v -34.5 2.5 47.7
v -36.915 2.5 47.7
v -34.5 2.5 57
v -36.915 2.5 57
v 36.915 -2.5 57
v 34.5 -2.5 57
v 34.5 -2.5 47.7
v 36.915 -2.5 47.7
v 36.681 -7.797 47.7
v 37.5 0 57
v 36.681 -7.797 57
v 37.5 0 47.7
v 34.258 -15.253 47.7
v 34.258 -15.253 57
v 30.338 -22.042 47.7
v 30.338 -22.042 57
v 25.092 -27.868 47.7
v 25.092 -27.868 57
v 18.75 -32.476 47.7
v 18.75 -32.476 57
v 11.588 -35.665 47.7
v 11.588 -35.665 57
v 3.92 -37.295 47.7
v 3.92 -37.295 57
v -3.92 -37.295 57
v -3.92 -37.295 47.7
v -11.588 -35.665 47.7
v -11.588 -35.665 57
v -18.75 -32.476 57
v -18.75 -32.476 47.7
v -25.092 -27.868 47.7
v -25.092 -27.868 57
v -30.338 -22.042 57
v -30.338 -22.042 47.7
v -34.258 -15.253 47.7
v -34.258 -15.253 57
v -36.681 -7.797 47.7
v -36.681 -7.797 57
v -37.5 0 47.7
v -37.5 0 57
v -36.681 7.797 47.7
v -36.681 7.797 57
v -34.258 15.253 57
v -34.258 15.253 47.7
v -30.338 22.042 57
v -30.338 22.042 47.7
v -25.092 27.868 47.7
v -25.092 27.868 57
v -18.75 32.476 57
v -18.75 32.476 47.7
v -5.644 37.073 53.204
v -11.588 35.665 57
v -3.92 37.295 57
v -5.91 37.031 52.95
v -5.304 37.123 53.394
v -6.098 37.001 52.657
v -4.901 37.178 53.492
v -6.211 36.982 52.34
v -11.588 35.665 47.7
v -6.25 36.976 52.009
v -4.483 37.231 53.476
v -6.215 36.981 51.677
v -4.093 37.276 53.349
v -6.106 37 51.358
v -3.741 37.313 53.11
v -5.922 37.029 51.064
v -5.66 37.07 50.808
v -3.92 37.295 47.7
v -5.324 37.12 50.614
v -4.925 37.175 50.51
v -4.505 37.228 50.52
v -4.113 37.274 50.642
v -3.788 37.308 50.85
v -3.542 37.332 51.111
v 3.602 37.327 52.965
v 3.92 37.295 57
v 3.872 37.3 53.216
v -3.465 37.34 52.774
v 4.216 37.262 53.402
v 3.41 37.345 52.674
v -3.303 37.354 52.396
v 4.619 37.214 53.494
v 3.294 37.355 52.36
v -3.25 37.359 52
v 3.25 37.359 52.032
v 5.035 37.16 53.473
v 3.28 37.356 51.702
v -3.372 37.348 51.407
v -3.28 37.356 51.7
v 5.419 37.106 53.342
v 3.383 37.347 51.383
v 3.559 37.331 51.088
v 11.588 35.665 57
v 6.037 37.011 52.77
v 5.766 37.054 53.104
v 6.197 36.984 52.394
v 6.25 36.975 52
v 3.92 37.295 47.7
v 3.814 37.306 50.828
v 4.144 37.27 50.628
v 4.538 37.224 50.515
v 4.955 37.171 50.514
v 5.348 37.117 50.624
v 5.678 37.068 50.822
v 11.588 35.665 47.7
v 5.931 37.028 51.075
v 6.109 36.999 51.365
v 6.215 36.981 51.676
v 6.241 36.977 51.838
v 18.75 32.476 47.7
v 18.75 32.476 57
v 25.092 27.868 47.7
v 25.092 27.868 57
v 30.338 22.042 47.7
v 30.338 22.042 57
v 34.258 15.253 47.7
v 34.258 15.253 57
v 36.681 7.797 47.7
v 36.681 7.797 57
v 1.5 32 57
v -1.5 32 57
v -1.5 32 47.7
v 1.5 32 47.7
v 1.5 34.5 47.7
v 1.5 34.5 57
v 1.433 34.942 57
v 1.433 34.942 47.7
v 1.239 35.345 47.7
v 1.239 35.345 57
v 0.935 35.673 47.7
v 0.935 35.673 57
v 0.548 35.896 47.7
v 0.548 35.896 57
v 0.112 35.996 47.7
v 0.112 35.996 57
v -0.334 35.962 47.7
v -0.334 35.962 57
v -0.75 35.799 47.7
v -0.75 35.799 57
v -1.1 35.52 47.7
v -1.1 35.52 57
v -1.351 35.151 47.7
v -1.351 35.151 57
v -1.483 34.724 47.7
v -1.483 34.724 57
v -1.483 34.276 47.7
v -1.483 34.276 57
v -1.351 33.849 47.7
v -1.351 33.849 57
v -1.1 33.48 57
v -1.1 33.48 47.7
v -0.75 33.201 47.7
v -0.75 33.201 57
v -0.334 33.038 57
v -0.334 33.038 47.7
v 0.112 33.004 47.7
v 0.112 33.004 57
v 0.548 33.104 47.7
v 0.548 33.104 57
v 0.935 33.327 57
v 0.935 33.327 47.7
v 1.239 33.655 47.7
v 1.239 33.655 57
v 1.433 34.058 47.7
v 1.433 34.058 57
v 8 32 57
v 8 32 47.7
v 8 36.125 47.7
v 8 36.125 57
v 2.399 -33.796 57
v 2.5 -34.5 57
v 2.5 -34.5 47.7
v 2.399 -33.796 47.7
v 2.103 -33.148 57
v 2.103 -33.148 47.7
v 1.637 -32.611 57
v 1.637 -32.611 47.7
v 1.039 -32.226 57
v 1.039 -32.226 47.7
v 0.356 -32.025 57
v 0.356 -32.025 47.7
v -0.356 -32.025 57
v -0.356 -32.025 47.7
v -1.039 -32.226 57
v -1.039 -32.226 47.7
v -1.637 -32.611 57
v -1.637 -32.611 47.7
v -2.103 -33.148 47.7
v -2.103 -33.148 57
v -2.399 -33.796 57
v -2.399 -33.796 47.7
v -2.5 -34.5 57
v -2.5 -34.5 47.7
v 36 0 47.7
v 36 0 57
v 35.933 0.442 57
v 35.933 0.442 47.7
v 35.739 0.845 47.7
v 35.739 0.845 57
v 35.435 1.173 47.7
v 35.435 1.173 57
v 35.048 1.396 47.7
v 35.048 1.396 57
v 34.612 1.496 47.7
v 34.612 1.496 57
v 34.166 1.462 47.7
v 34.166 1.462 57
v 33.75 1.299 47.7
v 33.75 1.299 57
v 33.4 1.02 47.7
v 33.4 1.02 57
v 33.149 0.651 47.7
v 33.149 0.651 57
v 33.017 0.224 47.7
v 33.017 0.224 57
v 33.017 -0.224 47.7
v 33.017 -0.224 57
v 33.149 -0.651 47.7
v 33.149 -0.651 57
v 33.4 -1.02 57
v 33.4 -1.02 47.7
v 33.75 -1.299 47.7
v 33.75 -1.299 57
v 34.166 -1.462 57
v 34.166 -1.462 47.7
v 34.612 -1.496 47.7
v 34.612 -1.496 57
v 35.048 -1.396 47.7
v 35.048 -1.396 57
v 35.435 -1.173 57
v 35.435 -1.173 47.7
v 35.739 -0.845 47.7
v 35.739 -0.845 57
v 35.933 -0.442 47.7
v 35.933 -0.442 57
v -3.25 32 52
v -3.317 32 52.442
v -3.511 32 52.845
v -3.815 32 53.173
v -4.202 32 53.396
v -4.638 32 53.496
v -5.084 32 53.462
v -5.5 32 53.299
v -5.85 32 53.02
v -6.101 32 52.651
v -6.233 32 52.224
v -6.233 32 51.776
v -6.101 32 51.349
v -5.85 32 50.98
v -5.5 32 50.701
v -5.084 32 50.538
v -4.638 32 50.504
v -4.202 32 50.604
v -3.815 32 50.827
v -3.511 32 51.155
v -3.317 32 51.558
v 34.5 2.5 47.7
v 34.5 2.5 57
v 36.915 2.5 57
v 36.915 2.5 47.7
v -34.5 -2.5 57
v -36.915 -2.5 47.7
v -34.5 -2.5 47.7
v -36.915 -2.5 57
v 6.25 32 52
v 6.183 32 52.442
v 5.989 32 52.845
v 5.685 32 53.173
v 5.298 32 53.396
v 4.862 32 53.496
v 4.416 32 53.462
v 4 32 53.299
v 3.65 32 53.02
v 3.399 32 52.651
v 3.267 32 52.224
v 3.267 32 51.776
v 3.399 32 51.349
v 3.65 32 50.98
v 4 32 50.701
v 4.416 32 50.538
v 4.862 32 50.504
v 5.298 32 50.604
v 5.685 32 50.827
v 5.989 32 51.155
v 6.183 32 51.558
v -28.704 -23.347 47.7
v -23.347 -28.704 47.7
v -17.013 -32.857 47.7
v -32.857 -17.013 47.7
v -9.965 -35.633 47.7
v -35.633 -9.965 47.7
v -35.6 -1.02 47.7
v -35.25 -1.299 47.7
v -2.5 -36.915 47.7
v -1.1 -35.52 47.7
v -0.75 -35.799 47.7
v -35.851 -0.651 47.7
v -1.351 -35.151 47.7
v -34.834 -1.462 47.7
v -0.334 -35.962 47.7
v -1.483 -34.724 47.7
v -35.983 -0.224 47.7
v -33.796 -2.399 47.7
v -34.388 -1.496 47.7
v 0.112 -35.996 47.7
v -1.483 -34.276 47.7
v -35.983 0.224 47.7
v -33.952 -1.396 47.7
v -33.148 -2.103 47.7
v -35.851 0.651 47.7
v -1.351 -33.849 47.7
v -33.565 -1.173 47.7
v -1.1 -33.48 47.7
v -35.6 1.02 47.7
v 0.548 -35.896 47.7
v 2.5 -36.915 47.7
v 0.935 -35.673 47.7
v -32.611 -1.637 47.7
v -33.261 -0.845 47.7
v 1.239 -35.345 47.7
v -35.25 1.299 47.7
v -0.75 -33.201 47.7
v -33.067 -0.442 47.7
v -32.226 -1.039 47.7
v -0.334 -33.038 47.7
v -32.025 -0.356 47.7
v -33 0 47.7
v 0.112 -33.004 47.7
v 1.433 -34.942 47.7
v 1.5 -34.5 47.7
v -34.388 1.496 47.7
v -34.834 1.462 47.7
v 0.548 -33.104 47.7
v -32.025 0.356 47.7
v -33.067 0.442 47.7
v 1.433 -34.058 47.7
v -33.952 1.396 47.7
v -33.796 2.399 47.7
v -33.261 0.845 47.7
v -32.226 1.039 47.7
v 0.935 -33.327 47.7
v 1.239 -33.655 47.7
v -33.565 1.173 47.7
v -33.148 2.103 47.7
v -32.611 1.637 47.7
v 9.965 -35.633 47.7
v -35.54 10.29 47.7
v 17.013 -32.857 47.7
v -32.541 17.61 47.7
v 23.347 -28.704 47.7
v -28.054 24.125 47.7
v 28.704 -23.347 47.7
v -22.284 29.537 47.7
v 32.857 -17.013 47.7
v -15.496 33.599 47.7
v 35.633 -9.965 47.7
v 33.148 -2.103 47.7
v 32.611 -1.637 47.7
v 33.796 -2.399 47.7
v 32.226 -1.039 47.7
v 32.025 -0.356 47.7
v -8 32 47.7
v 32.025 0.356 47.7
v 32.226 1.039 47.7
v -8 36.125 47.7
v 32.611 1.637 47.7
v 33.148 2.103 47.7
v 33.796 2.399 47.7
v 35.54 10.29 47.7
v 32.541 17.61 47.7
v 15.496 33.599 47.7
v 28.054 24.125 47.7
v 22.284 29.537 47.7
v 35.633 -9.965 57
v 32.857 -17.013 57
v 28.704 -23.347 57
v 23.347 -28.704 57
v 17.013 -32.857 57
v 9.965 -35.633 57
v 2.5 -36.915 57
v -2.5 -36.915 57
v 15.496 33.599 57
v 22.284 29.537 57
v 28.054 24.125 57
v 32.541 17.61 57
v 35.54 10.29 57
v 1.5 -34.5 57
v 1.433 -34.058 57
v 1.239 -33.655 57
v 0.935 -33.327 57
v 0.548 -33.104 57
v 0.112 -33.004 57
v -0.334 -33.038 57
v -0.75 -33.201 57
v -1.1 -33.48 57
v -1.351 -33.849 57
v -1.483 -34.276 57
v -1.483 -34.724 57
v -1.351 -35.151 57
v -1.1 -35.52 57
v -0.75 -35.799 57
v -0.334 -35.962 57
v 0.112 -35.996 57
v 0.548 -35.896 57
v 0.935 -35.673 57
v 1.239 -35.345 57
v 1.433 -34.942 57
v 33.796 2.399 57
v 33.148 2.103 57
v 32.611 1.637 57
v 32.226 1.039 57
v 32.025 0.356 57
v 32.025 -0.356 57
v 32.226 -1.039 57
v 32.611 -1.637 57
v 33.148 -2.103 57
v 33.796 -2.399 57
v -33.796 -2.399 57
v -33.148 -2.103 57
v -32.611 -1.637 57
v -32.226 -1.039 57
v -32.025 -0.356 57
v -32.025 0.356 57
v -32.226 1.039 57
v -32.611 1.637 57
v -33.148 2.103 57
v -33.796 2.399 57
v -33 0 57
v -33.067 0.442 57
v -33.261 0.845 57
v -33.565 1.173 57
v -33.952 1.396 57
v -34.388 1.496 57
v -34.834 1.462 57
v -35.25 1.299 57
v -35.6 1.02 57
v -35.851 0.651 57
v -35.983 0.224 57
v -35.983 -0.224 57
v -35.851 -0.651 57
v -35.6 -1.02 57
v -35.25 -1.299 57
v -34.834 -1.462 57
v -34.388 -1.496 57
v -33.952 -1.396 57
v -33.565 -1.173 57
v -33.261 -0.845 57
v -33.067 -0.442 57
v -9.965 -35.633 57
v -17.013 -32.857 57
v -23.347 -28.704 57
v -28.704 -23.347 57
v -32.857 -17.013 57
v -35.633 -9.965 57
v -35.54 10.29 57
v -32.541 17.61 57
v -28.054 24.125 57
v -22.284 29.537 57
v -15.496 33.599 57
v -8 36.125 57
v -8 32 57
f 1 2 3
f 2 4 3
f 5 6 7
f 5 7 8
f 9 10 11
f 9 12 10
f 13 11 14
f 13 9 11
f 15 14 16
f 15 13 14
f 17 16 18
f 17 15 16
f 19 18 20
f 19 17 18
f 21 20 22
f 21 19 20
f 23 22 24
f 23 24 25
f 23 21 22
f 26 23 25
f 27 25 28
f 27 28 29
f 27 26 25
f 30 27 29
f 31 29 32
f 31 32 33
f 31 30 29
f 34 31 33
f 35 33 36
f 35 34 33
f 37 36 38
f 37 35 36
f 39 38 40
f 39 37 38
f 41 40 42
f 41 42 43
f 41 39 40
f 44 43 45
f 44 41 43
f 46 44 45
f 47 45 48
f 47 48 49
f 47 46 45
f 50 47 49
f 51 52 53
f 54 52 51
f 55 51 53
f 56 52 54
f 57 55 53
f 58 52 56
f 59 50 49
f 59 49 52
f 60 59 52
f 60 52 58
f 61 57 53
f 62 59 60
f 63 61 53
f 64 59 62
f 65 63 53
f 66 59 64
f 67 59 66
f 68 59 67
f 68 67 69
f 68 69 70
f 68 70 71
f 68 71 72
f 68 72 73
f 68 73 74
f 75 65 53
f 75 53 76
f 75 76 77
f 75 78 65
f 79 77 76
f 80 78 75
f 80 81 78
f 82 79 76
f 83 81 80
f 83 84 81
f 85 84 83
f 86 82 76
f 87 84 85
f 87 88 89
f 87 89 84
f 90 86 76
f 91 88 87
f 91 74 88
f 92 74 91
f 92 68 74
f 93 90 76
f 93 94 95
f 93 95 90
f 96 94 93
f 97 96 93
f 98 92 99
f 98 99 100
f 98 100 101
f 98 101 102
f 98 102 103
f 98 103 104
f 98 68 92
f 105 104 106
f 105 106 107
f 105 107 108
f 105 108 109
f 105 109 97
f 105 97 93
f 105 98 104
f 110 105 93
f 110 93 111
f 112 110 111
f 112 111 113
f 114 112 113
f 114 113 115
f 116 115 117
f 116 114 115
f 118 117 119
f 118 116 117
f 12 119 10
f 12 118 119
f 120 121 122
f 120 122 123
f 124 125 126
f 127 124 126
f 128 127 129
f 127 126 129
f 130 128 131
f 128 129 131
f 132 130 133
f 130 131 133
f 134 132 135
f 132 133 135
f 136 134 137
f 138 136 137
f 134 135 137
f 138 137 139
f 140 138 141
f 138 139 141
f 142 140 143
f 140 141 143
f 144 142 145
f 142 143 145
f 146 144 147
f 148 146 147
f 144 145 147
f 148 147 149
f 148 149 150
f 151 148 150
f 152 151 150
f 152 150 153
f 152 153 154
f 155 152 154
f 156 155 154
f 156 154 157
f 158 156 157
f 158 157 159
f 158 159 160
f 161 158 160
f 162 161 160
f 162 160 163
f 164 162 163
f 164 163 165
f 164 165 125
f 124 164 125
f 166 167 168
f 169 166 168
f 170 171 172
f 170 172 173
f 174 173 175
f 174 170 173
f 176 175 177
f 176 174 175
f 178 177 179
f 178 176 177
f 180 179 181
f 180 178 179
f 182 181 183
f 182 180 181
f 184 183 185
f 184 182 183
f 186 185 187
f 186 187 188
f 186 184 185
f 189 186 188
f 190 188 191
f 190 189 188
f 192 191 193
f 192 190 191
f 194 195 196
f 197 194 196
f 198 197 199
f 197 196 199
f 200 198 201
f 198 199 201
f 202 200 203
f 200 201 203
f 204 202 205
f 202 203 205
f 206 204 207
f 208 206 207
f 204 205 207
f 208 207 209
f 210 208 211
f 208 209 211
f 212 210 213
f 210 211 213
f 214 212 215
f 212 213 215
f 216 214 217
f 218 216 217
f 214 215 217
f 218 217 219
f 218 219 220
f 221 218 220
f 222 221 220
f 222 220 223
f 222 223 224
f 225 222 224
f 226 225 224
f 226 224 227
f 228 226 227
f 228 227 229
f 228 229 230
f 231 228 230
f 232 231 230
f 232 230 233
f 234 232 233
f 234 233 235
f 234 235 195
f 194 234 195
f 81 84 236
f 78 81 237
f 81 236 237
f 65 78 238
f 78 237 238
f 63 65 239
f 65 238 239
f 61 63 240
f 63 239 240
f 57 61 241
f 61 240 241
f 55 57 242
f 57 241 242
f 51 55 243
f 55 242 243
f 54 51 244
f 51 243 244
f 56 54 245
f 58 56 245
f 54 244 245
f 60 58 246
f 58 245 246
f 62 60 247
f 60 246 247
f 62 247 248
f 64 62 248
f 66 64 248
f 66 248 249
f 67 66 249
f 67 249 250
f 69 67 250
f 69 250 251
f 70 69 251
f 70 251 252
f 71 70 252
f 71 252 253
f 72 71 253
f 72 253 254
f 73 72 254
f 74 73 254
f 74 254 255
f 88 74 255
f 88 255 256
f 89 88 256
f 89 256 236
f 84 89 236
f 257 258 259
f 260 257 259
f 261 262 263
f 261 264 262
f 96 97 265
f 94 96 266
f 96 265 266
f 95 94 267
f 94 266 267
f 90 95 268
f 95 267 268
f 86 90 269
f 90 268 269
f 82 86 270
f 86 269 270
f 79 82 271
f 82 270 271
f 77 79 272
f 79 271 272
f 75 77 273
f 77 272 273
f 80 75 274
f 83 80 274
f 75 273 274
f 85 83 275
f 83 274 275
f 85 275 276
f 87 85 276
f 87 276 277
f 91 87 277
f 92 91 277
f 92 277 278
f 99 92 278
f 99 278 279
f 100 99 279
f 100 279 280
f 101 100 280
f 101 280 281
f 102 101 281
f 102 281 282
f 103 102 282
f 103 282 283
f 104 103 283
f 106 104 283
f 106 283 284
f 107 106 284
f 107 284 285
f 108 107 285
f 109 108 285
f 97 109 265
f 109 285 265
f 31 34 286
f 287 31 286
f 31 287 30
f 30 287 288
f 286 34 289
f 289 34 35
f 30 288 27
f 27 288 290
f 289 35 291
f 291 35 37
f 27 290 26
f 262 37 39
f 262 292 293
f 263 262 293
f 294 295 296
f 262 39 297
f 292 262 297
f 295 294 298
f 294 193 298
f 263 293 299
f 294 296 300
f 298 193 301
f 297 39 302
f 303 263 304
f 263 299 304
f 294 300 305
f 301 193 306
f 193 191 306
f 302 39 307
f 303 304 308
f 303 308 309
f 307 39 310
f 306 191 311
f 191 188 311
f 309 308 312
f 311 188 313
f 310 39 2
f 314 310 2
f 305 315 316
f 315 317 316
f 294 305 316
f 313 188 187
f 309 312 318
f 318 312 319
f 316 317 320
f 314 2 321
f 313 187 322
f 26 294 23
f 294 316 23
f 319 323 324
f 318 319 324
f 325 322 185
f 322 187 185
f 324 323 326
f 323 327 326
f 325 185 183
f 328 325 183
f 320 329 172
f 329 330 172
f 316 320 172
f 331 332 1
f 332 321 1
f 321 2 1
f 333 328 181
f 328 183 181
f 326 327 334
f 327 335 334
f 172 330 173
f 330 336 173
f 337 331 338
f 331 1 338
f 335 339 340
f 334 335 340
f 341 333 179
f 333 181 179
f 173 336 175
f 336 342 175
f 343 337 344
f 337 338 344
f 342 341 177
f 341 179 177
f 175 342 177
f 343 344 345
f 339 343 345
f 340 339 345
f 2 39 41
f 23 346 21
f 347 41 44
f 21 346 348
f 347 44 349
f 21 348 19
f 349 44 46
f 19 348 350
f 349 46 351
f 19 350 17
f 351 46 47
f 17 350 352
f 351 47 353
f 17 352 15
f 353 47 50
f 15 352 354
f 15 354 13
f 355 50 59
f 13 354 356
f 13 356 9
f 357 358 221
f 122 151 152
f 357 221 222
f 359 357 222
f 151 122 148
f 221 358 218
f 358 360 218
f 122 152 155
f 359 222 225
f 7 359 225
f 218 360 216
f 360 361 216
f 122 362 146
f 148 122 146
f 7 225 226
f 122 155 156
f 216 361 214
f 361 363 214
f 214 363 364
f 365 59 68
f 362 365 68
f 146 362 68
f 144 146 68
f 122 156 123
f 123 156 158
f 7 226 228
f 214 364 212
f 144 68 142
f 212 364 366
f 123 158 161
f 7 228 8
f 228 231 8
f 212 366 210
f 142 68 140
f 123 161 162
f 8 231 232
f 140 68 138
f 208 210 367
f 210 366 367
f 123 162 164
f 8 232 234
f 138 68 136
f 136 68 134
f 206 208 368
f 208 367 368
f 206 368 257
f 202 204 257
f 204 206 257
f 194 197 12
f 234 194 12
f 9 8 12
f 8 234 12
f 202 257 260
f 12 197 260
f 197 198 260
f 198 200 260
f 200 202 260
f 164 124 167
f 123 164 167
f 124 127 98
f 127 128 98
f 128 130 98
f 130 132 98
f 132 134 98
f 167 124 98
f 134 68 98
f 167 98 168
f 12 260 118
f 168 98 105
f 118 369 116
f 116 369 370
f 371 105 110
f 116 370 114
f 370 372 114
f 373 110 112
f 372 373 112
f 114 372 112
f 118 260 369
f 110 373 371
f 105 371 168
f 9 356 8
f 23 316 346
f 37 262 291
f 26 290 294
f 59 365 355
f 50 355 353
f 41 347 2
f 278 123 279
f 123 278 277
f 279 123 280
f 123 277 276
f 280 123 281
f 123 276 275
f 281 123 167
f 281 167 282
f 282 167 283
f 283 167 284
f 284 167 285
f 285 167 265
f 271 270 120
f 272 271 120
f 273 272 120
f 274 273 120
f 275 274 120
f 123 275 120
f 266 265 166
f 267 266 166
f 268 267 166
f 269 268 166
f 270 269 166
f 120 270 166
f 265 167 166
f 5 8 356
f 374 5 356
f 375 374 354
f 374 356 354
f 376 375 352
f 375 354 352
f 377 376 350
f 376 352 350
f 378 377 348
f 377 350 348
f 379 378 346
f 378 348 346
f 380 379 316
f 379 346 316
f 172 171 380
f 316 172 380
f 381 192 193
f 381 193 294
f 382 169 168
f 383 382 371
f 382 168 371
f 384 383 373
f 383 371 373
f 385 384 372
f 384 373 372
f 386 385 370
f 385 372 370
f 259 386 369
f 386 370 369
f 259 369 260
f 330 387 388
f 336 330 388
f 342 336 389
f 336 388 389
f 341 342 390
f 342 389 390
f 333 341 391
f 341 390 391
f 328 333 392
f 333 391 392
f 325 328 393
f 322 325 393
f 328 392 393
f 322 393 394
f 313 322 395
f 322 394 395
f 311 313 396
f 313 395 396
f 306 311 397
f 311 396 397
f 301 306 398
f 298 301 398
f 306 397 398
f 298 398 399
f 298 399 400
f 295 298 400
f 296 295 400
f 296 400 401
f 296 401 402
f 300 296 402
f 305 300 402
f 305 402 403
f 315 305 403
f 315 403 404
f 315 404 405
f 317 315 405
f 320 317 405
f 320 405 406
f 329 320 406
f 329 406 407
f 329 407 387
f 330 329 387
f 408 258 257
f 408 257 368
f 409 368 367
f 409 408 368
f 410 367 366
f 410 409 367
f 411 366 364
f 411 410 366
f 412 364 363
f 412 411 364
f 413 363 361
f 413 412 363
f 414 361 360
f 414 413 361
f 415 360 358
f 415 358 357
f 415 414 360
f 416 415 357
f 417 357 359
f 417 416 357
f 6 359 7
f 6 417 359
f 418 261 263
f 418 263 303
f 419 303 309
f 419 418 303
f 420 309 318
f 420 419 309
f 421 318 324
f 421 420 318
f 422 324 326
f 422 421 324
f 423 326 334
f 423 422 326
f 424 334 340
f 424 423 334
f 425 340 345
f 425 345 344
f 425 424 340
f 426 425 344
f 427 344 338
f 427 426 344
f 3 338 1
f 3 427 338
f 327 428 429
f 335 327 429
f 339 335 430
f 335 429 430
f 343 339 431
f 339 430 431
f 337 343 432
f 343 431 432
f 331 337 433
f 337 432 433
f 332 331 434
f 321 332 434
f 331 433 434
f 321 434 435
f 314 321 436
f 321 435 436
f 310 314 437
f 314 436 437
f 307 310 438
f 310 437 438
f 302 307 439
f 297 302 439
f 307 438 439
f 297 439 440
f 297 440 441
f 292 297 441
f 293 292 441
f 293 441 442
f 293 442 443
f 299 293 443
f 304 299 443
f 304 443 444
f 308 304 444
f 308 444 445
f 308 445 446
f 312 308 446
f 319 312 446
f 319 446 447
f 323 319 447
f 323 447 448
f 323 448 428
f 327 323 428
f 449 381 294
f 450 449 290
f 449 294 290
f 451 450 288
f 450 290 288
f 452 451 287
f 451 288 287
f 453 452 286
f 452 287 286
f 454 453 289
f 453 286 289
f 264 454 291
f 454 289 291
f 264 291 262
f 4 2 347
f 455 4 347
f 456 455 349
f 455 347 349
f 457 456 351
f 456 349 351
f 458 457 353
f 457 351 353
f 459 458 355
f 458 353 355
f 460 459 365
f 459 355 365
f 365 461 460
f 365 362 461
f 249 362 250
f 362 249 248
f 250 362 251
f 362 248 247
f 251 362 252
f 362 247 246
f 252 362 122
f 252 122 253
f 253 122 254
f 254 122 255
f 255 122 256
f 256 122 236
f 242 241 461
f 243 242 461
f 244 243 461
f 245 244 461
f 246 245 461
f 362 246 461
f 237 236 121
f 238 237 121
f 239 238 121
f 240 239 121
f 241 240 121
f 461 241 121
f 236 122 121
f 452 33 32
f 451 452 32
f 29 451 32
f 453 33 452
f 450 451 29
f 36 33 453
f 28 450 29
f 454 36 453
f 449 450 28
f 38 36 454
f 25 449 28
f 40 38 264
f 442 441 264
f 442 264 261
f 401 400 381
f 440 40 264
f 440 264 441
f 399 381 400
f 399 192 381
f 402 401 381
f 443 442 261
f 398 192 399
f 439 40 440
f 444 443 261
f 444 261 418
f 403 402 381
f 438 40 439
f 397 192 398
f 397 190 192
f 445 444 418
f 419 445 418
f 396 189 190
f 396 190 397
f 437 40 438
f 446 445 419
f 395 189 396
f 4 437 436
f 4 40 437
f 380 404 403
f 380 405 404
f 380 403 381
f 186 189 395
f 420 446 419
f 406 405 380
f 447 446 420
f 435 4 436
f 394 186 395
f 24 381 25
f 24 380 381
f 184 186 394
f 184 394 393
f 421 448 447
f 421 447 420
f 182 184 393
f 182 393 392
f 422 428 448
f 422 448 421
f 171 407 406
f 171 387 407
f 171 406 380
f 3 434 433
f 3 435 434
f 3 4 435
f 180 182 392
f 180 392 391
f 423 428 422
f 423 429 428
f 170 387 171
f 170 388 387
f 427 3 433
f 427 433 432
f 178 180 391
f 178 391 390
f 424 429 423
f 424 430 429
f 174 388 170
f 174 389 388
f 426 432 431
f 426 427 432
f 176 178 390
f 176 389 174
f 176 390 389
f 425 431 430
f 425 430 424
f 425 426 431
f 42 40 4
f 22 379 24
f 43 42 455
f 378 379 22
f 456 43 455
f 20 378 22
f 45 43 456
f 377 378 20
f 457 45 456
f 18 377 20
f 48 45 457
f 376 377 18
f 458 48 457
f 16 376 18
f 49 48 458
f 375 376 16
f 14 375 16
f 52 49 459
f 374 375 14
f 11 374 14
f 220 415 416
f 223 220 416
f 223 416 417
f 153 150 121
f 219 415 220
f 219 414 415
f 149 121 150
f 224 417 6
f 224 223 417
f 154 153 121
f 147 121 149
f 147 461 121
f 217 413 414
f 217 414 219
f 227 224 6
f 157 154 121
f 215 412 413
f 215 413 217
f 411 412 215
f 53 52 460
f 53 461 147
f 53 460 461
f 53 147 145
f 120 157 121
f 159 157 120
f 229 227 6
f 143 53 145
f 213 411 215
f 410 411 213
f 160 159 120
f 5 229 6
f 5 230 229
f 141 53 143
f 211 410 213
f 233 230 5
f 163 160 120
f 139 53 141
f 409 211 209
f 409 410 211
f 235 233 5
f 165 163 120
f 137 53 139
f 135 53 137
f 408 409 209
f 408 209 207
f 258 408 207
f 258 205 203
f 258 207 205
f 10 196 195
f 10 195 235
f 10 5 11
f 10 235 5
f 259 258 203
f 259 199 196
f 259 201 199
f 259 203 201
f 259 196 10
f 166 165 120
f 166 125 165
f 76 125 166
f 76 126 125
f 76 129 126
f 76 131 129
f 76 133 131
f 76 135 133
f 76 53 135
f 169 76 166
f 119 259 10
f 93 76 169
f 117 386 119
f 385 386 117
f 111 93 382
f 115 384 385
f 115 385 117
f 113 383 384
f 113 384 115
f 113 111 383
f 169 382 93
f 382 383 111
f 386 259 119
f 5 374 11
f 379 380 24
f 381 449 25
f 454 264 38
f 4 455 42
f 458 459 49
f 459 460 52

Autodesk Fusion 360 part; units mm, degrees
sketch "Esboço2" plane through (0, 0, 0) normal (0, 0, 1) x (1, 0, 0)
  circle A0 centre (0, 0) radius 37.5
  circle A1 centre (0, 0) radius 37
  dimension "d6" = 75
  dimension "d7" = 74
extrude "Extrusão2" add sketch "Esboço2" along normal blind 190
ref_plane "Plano de trabalho9" through (0, 0, 187) normal (0, 0, 1) x (1, 0, 0)
sketch "Esboço10" plane through (0, 0, 187) normal (0, 0, 1) x (1, 0, 0)
  circle A0 centre (0, 0) radius 34.5 construction
  line L0 (0, 0) -> (-68.1762, 0) construction
  line L1 (0, 0) -> (60, 0) construction
  line L2 (0, 0) -> (0, 45) construction
  line L3 (0, 0) -> (0, -43.1659) construction
  circle A1 centre (34.5, 0) radius 1.5
  line L4 (3, -43) -> (3, -42)
  circle A2 centre (0, 34.5) radius 1.5
  circle A3 centre (-34.5, 0) radius 1.5
  circle A4 centre (0, -34.5) radius 1.5
  arc A5 (34.5, 2.5) -> (34.5, -2.5) centre (34.5, 0) ccw
  arc A6 (-2.5, 34.5) -> (2.5, 34.5) centre (0, 34.5) ccw
  arc A7 (-34.5, -2.5) -> (-34.5, 2.5) centre (-34.5, 0) ccw
  arc A8 (2.5, -34.5) -> (-2.5, -34.5) centre (0, -34.5) ccw
  circle A9 centre (0, 0) radius 37
  line L5 (-36.9154, 2.5) -> (-34.4093, 2.5)
  line L6 (-36.9154, -2.5) -> (-34.4093, -2.5)
  line L7 (34.5, 2.5) -> (36.9154, 2.5)
  line L8 (34.5, -2.5) -> (36.9154, -2.5)
  line L9 (2.5, 36.9154) -> (2.5, 34.4093)
  line L10 (-2.5, 36.9154) -> (-2.5, 34.4093)
  line L11 (-2.5, -34.4093) -> (-2.5, -36.9154)
  line L12 (2.5, -34.4093) -> (2.5, -36.9154)
  dimension "d82" = 69
  dimension "d83" = 3
  dimension "d84" = 2.5
  dimension "d85" = 2.5
  dimension "d87" = 360
  dimension "d89" = 360
  dimension "d90" = 2.5
extrude "Extrusão12" add sketch "Esboço10" against normal blind 184 contours A5 A9 L7 L8 | A6 A9 L9 L10 | A8 A9 L11 L12 | A7 A9 L5 L6
thread "Rosca3"
ref_plane "Plano de trabalho3" through (0, 0, 32) normal (0, 0, 1) x (1, 0, 0)
sketch "Esboço3" plane through (0, 0, 32) normal (0, 0, 1) x (1, 0, 0)
  line L0 (0, 0) -> (0, 37) construction
  line L1 (34.2491, 14) -> (-34.2491, 14)
  circle A0 centre (0, 0) radius 37
  line L2 (31.1288, 20) -> (-31.1288, 20)
  line L3 (32.8634, 17) -> (-32.8634, 17)
  circle A1 centre (0, 0) radius 50
  circle A2 centre (0, 0) radius 37.5
  line L4 (-8, 0) -> (8, 0)
  line L5 (8, 0) -> (8, 36.1248)
  line L6 (-8, 0) -> (-8, 36.1248)
  circle A3 centre (0, 34.5) radius 1.5
  line L7 (1.5, 32.5) -> (1.5, 0)
  arc A4 (-2.5, 34.5) -> (2.5, 34.5) centre (0, 34.5) ccw
  line L8 (-1.5, 32.5) -> (-1.5, 0)
  line L9 (27.8634, 24.3441) -> (27.8634, 11)
  line L10 (27.8634, 11) -> (35.327, 11)
  line L11 (-27.8634, 11) -> (-35.327, 11)
  line L12 (-27.8634, 24.3441) -> (-27.8634, 11)
  line L13 (-30.4631, 21) -> (30.4631, 21)
  line L14 (-34.641, 13) -> (34.641, 13)
  line L15 (0, 32) -> (8, 32)
  line L16 (0, 32) -> (-8, 32)
  dimension "d12" = 6
  dimension "d15" = 3
  dimension "d17" = 75
  dimension "d18" = 100
  dimension "d41" = 14
  dimension "d51" = 8
  dimension "d52" = 16
  dimension "d99" = 3
  dimension "d100" = 2.5
  dimension "d115" = 6.5
  dimension "d123" = 5
  dimension "d124" = 6
  dimension "d143" = 4
  dimension "d144" = 4
extrude "Extrusão21" add sketch "Esboço3" along normal blind 6 and the other way blind 6 contours L1 A0 L9 L14 | L1 A0 L3 L9 | A0 L9 L10 L14 | A0 L2 L3 L9 | A0 L2 L9 L13 | A0 L9 L13 | A0 L11 L12 L14 | L1 A0 L12 L14 | L1 A0 L3 L12 | A0 L2 L3 L12 | A0 L12 L13 | A0 L2 L12 L13
sketch "Esboço18" plane through (-27.8634, 0, 0) normal (1, 0, 0) x (0, 1, 0)
  line L0 (24.3441, 26) -> (24.3441, 38)
  line L1 (24.3441, 38) -> (11, 38)
  line L2 (11, 38) -> (11, 26)
  line L3 (11, 26) -> (24.3441, 26)
  circle A0 centre (17, 32) radius 4
  point P0 (11, 32)
  dimension "d166" = 8
  dimension "d167" = 6
  dimension "d168" = 6
ref_plane "Plano de trabalho11" through (0, 0, 0) normal (1, 0, 0) x (0, 1, 0)
extrude "Extrusão23" cut sketch "Esboço18" against normal blind 15 contours A0
extrude "Extrusão7" add sketch "Esboço3" along normal blind 30 and the other way blind 30 contours L1 L5 L7 L14 | L1 L3 L5 L7 | L4 L5 L7 L14 | L2 L3 L5 L7 | L1 L6 L8 L14 | L1 L3 L6 L8 | L2 L5 L7 L13 | L2 L3 L6 L8 | L4 L6 L8 L14 | L5 L7 L13 L15 | A0 L5 L6 L7 A4 L8 L15 L16 | L2 L6 L8 L13 | L6 L8 L13 L16 | L7 A4 L15 | A4 L8 L16
sketch "Esboço19" plane through (27.8634, 0, 0) normal (-1, 0, 0) x (0, -1, 0)
  line L0 (-11, 26) -> (-11, 38)
  line L1 (-11, 38) -> (-24.3441, 38)
  line L2 (-24.3441, 38) -> (-24.3441, 26)
  line L3 (-24.3441, 26) -> (-11, 26)
extrude "Extrusão24" cut sketch "Esboço18" along normal blind 80 contours A0
sketch "Esboço11" plane through (8, 0, 0) normal (1, 0, 0) x (0, 1, 0)
  line L0 (0, 2) -> (36.1248, 2)
  line L1 (36.1248, 2) -> (36.1248, 62)
  line L2 (36.1248, 62) -> (0, 62)
  line L3 (0, 62) -> (0, 2)
  circle A0 centre (17, 32) radius 3
  circle A1 centre (17, 32) radius 9.5
  circle A2 centre (17, 32) radius 12.5
  line L4 (36.1248, 32) -> (36.1248, -5) construction
  line L5 (0, 32) -> (36.1248, 32)
  line L6 (30.1248, 2) -> (8.3278, 22.9976)
  line L7 (30.1248, 62) -> (8.3278, 41.0024)
  line L8 (30.1248, 2) -> (31.9998, 2)
  line L9 (31.9998, 2) -> (31.9998, 32)
  line L10 (30.1248, 62) -> (31.9998, 62)
  line L11 (31.9998, 62) -> (31.9998, 32)
  circle A3 centre (17, 32) radius 4
  point P0 (14, 32)
  point P1 (20, 32)
  dimension "d106" = 6
  dimension "d107" = 19
  dimension "d109" = 25
  dimension "d110" = 6
  dimension "d147" = 1.875
extrude "Extrusão13" cut sketch "Esboço11" against normal blind 16 contours L0 L3 A2 L5 L6 | L0 A2 L5 L6 L8 L9 | L2 L3 A2 L5 L7 | A1 A2 L5 | A1 A2 L5 | L2 A2 L5 L7 L10 L11 | A1 L5 A3 | A1 L5 A3 | A0 L5 A3 | A0 L5 A3 | A0 L5 | A0 L5
ref_plane "Plano de trabalho4" through (0, 0, 150) normal (0, 0, 1) x (1, 0, 0)
sketch "Esboço4" plane through (0, 0, 150) normal (0, 0, 1) x (1, 0, 0)
  circle A0 centre (0, 0) radius 37
  circle A1 centre (0, 0) radius 50
  circle A2 centre (0, 0) radius 37.5
  line L0 (-20, -31.1288) -> (-20, 31.1288)
  line L1 (-17, -32.8634) -> (-17, 32.8634)
  line L2 (-14, -34.2491) -> (-14, 34.2491)
  line L3 (0, 8) -> (0, -8)
  line L4 (0, 8) -> (-36.1248, 8)
  line L5 (0, -8) -> (-36.1248, -8)
  line L6 (0, 0) -> (-37, 0) construction
  circle A3 centre (-34.5, 0) radius 1.5
  line L7 (0, 1.5) -> (-32.5, 1.5)
  arc A4 (-34.5, -2.5) -> (-34.5, 2.5) centre (-34.5, 0) ccw
  line L8 (0, -1.5) -> (-32.5, -1.5)
  line L9 (-24.3441, -27.8634) -> (-11, -27.8634)
  line L10 (-11, -27.8634) -> (-11, -35.327)
  line L11 (-24.3441, 27.8634) -> (-11, 27.8634)
  line L12 (-11, 27.8634) -> (-11, 35.327)
  line L13 (-13, 34.641) -> (-13, -34.641)
  line L14 (-21, 30.4631) -> (-21, -30.4631)
  line L15 (-32, 0) -> (-32, 8)
  line L16 (-32, 0) -> (-32, -8)
  dimension "d28" = 75
  dimension "d29" = 100
  dimension "d38" = 14
  dimension "d39" = 6
  dimension "d40" = 3
  dimension "d43" = 16
  dimension "d44" = 8
  dimension "d101" = 3
  dimension "d102" = 2.5
  dimension "d116" = 6.5
  dimension "d135" = 6
  dimension "d136" = 5
  dimension "d145" = 4
  dimension "d146" = 4
extrude "Extrusão25" add sketch "Esboço4" along normal blind 6 and the other way blind 6 contours A0 L11 L12 L13 | A0 L9 L10 L13 | A0 L2 L11 L13 | A0 L2 L9 L13 | A0 L1 L2 L11 | A0 L1 L2 L9 | A0 L0 L1 L11 | A0 L0 L1 L9 | A0 L0 L11 L14 | A0 L0 L9 L14 | A0 L11 L14 | A0 L9 L14
sketch "Esboço20" plane through (0, 27.8634, 0) normal (0, -1, 0) x (1, 0, 0)
  line L0 (-11, 144) -> (-11, 156)
  line L1 (-11, 156) -> (-24.3441, 156)
  line L2 (-24.3441, 156) -> (-24.3441, 144)
  line L3 (-24.3441, 144) -> (-11, 144)
  circle A0 centre (-17, 150) radius 4
  dimension "d179" = 8
  dimension "d180" = 6
  dimension "d182" = 6
extrude "Extrusão26" cut sketch "Esboço20" against normal blind 15 contours A0
sketch "Esboço21" plane through (0, -27.8634, 0) normal (0, 1, 0) x (-1, 0, 0)
  line L0 (24.3441, 144) -> (24.3441, 156)
  line L1 (24.3441, 156) -> (11, 156)
  line L2 (11, 156) -> (11, 144)
  line L3 (11, 144) -> (24.3441, 144)
  circle A0 centre (17, 150) radius 4
  dimension "d185" = 8
  dimension "d186" = 6
  dimension "d187" = 6
extrude "Extrusão27" cut sketch "Esboço21" against normal blind 15 contours A0
extrude "Extrusão6" add sketch "Esboço4" along normal blind 30 and the other way blind 30 contours L2 L4 L7 L13 | L3 L4 L7 L13 | L3 L5 L8 L13 | L2 L5 L8 L13 | L1 L2 L4 L7 | L1 L2 L5 L8 | L0 L1 L4 L7 | L0 L1 L5 L8 | L0 L4 L7 L14 | L0 L5 L8 L14 | A0 L4 L5 L7 A4 L8 L15 L16 | L4 L7 L14 L15 | L5 L8 L14 L16 | L7 A4 L15 | A4 L8 L16
sketch "Esboço13" plane through (0, -8, 0) normal (0, -1, 0) x (1, 0, 0)
  line L0 (0, 120) -> (0, 180)
  line L1 (0, 180) -> (-36.1248, 180)
  line L2 (-36.1248, 180) -> (-36.1248, 120)
  line L3 (-36.1248, 120) -> (0, 120)
  circle A0 centre (-17, 150) radius 3
  circle A1 centre (-17, 150) radius 9.5
  circle A2 centre (-17, 150) radius 12.5
  line L4 (-36.1248, 150) -> (-36.1248, 198.4836) construction
  line L5 (-30.1248, 180) -> (-6.6704, 157.4058)
  line L6 (0, 150) -> (-36.1248, 150)
  line L7 (-30.1248, 120) -> (-6.6704, 142.5942)
  line L8 (-30.1248, 180) -> (-31.9998, 180)
  line L9 (-31.9998, 180) -> (-31.9998, 150)
  line L10 (-30.1248, 120) -> (-31.9998, 120)
  line L11 (-31.9998, 120) -> (-31.9998, 150)
  point P0 (-14, 150)
  point P1 (-20, 150)
  dimension "d117" = 6
  dimension "d118" = 19
  dimension "d119" = 25
  dimension "d120" = 6
  dimension "d148" = 1.875
extrude "Extrusão14" cut sketch "Esboço13" against normal blind 16 contours L0 L3 A2 L6 L7 | L0 L1 A2 L5 L6 | L3 A2 L6 L7 L10 L11 | A1 A2 L6 | A1 A2 L6 | L1 A2 L5 L6 L8 L9 | A0 A1 L6 | A0 A1 L6 | A0 L6 | A0 L6
ref_plane "Plano de trabalho5" through (0, 0, 0) normal (1, 0, 0) x (0, 1, 0)
ref_plane "Plano de trabalho6" through (0, 0, 0) normal (0, 1, 0) x (0, 0, 1)
ref_plane "Plano de trabalho7" through (0, 0, 134.3) normal (0, 0, 1) x (1, 0, 0)
sketch "Esboço8" plane through (0, 0, 134.3) normal (0, 0, 1) x (1, 0, 0)
  line L0 (46.3444, 0) -> (0, 0) construction
  line L1 (8, 36.1248) -> (8, -36.1248)
  line L2 (-8, -36.1248) -> (-8, 36.1248)
  circle A0 centre (0, 0) radius 37
  line L3 (0, 0) -> (0, 37) construction
  circle A1 centre (0, 34.5) radius 1.5
  circle A2 centre (0, -34.5) radius 1.5
  dimension "d72" = 8
  dimension "d73" = 8
  dimension "d95" = 2.5
  dimension "d96" = 3
extrude "Extrusão10" add sketch "Esboço8" along normal blind 2 contours L1 L2 A0
ref_plane "Plano de trabalho8" through (0, 0, 45.7) normal (0, 0, 1) x (1, 0, 0)
sketch "Esboço9" plane through (0, 0, 45.7) normal (0, 0, 1) x (1, 0, 0)
  line L0 (0, 0) -> (-37, 0) construction
  line L1 (-36.1248, 8) -> (36.1248, 8)
  line L2 (-36.1248, -8) -> (36.1248, -8)
  circle A0 centre (0, 0) radius 37
  circle A1 centre (-34.5, 0) radius 1.5
  line L3 (0, 0) -> (0, 43.2459) construction
  circle A2 centre (34.5, 0) radius 1.5
  dimension "d77" = 8
  dimension "d78" = 8
  dimension "d97" = 3
  dimension "d98" = 2.5
extrude "Extrusão11" add sketch "Esboço9" along normal blind 2 contours L1 L2 A0
ref_plane "Plano de trabalho10" through (8, 18.0624, 32) normal (1, 0, 0) x (0, 1, 0)
sketch "Esboço16" plane through (-31.9998, 0, 0) normal (1, 0, 0) x (0, 1, 0)
  line L0 (1.5, 180) -> (1.5, 120)
  line L1 (1.5, 120) -> (8, 120)
  line L2 (8, 120) -> (8, 180)
  line L3 (8, 180) -> (1.5, 180)
  line L4 (4.75, 180) -> (4.75, 120) construction
  circle A0 centre (4.75, 170) radius 1.5
  circle A1 centre (4.75, 130) radius 1.5
  line L5 (8, 150) -> (-12.335, 150) construction
  line L6 (0, 2.5) -> (0, 20)
  circle A2 centre (-4.75, 170) radius 1.5
  circle A3 centre (-4.75, 130) radius 1.5
  dimension "d149" = 3
  dimension "d150" = 3
  dimension "d151" = 40
  dimension "d152" = 20
extrude "Extrusão19" cut sketch "Esboço16" against normal blind 10 contours A0 | A1 | A2 | A3
sketch "Esboço17" plane through (0, 31.9998, 0) normal (0, -1, 0) x (1, 0, 0)
  line L0 (1.5, 62) -> (1.5, 2)
  line L1 (1.5, 2) -> (8, 2)
  line L2 (8, 2) -> (8, 62)
  line L3 (8, 62) -> (1.5, 62)
  line L4 (4.75, 2) -> (4.75, 62) construction
  line L5 (8, 32) -> (-12, 32) construction
  circle A0 centre (4.75, 52) radius 1.5
  circle A1 centre (4.75, 12) radius 1.5
  line L6 (0, 1.75) -> (0, 22.5)
  circle A2 centre (-4.75, 12) radius 1.5
  circle A3 centre (-4.75, 52) radius 1.5
  dimension "d155" = 3
  dimension "d156" = 3
  dimension "d157" = 40
  dimension "d158" = 20
extrude "Extrusão20" cut sketch "Esboço17" against normal blind 10 contours A0 | A1 | A2 | A3
thread "Rosca4"
thread "Rosca5"
sketch "Esboço22" plane through (0, 0, 136.3) normal (0, 0, 1) x (-1, 0, 0)
  line L0 (2.5, 36.9154) -> (2.5, 34.5)
  arc A0 (-2.5, 34.5) -> (2.5, 34.5) centre (0, 34.5) ccw
  line L1 (-2.5, 34.5) -> (-2.5, 36.9154)
  arc A1 (-2.5, 36.9154) -> (-8, 36.1248) centre (0, 0) ccw
  line L2 (-8, 36.1248) -> (-8, -36.1248)
  arc A2 (-8, -36.1248) -> (-2.5, -36.9154) centre (0, 0) ccw
  line L3 (-2.5, -36.9154) -> (-2.5, -34.5)
  arc A3 (2.5, -34.5) -> (-2.5, -34.5) centre (0, -34.5) ccw
  line L4 (2.5, -34.5) -> (2.5, -36.9154)
  arc A4 (2.5, -36.9154) -> (8, -36.1248) centre (0, 0) ccw
  line L5 (8, -36.1248) -> (8, 36.1248)
  arc A5 (8, 36.1248) -> (2.5, 36.9154) centre (0, 0) ccw
  line L6 (0, 0) -> (-21, 0) construction
  line L7 (0, 0) -> (0, -19.3) construction
  line L8 (2, -15.8) -> (-2, -15.8)
  arc A6 (-2, -15.8) -> (-2, -22.8) centre (-2, -19.3) ccw
  line L9 (-2, -22.8) -> (2, -22.8)
  arc A7 (2, -22.8) -> (2, -15.8) centre (2, -19.3) ccw
  line L10 (2, -19.3) -> (-2, -19.3) construction
  arc A8 (-2, 22.8) -> (-2, 15.8) centre (-2, 19.3) ccw
  line L11 (2, 15.8) -> (-2, 15.8)
  arc A9 (2, 15.8) -> (2, 22.8) centre (2, 19.3) ccw
  line L12 (-2, 22.8) -> (2, 22.8)
  circle A10 centre (0, 10.8) radius 1.5 construction
  line L13 (2, 19.3) -> (-2, 19.3) construction
  line L14 (2, 12.3) -> (-2, 12.3)
  arc A11 (-2, 12.3) -> (-2, 9.3) centre (-2, 10.8) ccw
  line L15 (-2, 9.3) -> (2, 9.3)
  arc A12 (2, 9.3) -> (2, 12.3) centre (2, 10.8) ccw
  line L16 (2, 10.8) -> (-2, 10.8) construction
  line L17 (2, 26.3) -> (-2, 26.3)
  arc A13 (2, 26.3) -> (2, 29.3) centre (2, 27.8) ccw
  line L18 (-2, 29.3) -> (2, 29.3)
  arc A14 (-2, 29.3) -> (-2, 26.3) centre (-2, 27.8) ccw
  arc A15 (2, -29.3) -> (2, -26.3) centre (2, -27.8) ccw
  line L19 (2, -26.3) -> (-2, -26.3)
  arc A16 (-2, -26.3) -> (-2, -29.3) centre (-2, -27.8) ccw
  line L20 (-2, -29.3) -> (2, -29.3)
  arc A17 (2, -12.3) -> (2, -9.3) centre (2, -10.8) ccw
  line L21 (-2, -9.3) -> (2, -9.3)
  arc A18 (-2, -9.3) -> (-2, -12.3) centre (-2, -10.8) ccw
  line L22 (2, -12.3) -> (-2, -12.3)
  point P0 (0, -19.3)
  point P1 (0, 10.8)
  dimension "d191" = 19.3
  dimension "d195" = 2
  dimension "d196" = 3.5
  dimension "d204" = 3
  dimension "d205" = 8.5
  dimension "d230" = 1.5
  dimension "d231" = 4
extrude "Extrusão28" cut sketch "Esboço22" against normal blind 5 contours L8 A6 L9 A7 | A8 L11 A9 L12 | L14 A11 L15 A12 | L17 A13 L18 A14 | A15 L19 A16 L20 | A17 L21 A18 L22
sketch "Esboço23" plane through (0, 0, 45.7) normal (0, 0, -1) x (1, 0, 0)
  line L0 (36.9154, -2.5) -> (34.5, -2.5)
  arc A0 (34.5, 2.5) -> (34.5, -2.5) centre (34.5, 0) ccw
  line L1 (34.5, 2.5) -> (36.9154, 2.5)
  arc A1 (36.9154, 2.5) -> (36.1248, 8) centre (0, 0) ccw
  line L2 (36.1248, 8) -> (-36.1248, 8)
  arc A2 (-36.1248, 8) -> (-36.9154, 2.5) centre (0, 0) ccw
  line L3 (-36.9154, 2.5) -> (-34.5, 2.5)
  arc A3 (-34.5, -2.5) -> (-34.5, 2.5) centre (-34.5, 0) ccw
  line L4 (-34.5, -2.5) -> (-36.9154, -2.5)
  arc A4 (-36.9154, -2.5) -> (-36.1248, -8) centre (0, 0) ccw
  line L5 (-36.1248, -8) -> (36.1248, -8)
  arc A5 (36.1248, -8) -> (36.9154, -2.5) centre (0, 0) ccw
  line L6 (0, 0) -> (0, -19) construction
  line L7 (0, 0) -> (19.3, 0)
  line L8 (15.8, 2.5) -> (15.8, -2.5)
  arc A6 (15.8, -2.5) -> (22.8, -2.5) centre (19.3, -2.5) ccw
  line L9 (22.8, -2.5) -> (22.8, 2.5)
  arc A7 (22.8, 2.5) -> (15.8, 2.5) centre (19.3, 2.5) ccw
  line L10 (19.3, 2.5) -> (19.3, -2.5) construction
  line L11 (-15.8, 2.5) -> (-15.8, -2.5)
  arc A8 (-15.8, 2.5) -> (-22.8, 2.5) centre (-19.3, 2.5) ccw
  line L12 (-22.8, -2.5) -> (-22.8, 2.5)
  arc A9 (-22.8, -2.5) -> (-15.8, -2.5) centre (-19.3, -2.5) ccw
  circle A10 centre (10.8, 0) radius 1.5 construction
  circle A11 centre (27.8, 0) radius 1.5 construction
  line L13 (9.3, 2.5) -> (9.3, -2.5)
  arc A12 (9.3, -2.5) -> (12.3, -2.5) centre (10.8, -2.5) ccw
  line L14 (12.3, -2.5) -> (12.3, 2.5)
  arc A13 (12.3, 2.5) -> (9.3, 2.5) centre (10.8, 2.5) ccw
  line L15 (10.8, 2.5) -> (10.8, -2.5) construction
  line L16 (26.3, -2.5) -> (26.3, 2.5)
  arc A14 (26.3, -2.5) -> (29.3, -2.5) centre (27.8, -2.5) ccw
  line L17 (29.3, 2.5) -> (29.3, -2.5)
  arc A15 (29.3, 2.5) -> (26.3, 2.5) centre (27.8, 2.5) ccw
  line L18 (-12.3, -2.5) -> (-12.3, 2.5)
  arc A16 (-12.3, -2.5) -> (-9.3, -2.5) centre (-10.8, -2.5) ccw
  line L19 (-9.3, 2.5) -> (-9.3, -2.5)
  arc A17 (-9.3, 2.5) -> (-12.3, 2.5) centre (-10.8, 2.5) ccw
  line L20 (-26.3, -2.5) -> (-26.3, 2.5)
  arc A18 (-29.3, -2.5) -> (-26.3, -2.5) centre (-27.8, -2.5) ccw
  line L21 (-29.3, 2.5) -> (-29.3, -2.5)
  arc A19 (-26.3, 2.5) -> (-29.3, 2.5) centre (-27.8, 2.5) ccw
  point P0 (19.3, 0)
  point P1 (10.8, 0)
  dimension "d199" = 3.5
  dimension "d200" = 5
  dimension "d201" = 19.3
  dimension "d206" = 3
  dimension "d207" = 8.5
  dimension "d228" = 2.5
  dimension "d229" = 1.5
extrude "Extrusão29" cut sketch "Esboço23" against normal blind 10 contours L7 L13 L14 A13 | L8 A6 L9 A7 | L7 L13 A12 L14 | L11 A8 L12 A9 | L16 A14 L17 A15 | L20 A18 L21 A19
ref_plane "Plano de trabalho12" through (0, 0, 106.3) normal (0, 0, 1) x (1, 0, 0)
sketch "Esboço24" plane through (0, 0, 106.3) normal (0, 0, 1) x (1, 0, 0)
  line L0 (0, 0) -> (28.1868, 0) construction
  line L1 (16, 0) -> (16, 33.3617)
  circle A0 centre (0, 0) radius 37
  line L2 (16, 0) -> (16, -33.3617)
  line L3 (0, 0) -> (0, 19.3) construction
  line L4 (-16, 0) -> (-16, 33.3617)
  line L5 (-16, 0) -> (-16, -33.3617)
  line L6 (-2, 6.8) -> (2, 6.8)
  arc A1 (2, 6.8) -> (2, 31.8) centre (2, 19.3) ccw
  line L7 (2, 31.8) -> (-2, 31.8)
  arc A2 (-2, 31.8) -> (-2, 6.8) centre (-2, 19.3) ccw
  line L8 (-2, 19.3) -> (2, 19.3) construction
  arc A3 (2, -31.8) -> (2, -6.8) centre (2, -19.3) ccw
  arc A4 (-2, -6.8) -> (-2, -31.8) centre (-2, -19.3) ccw
  line L9 (-2, -6.8) -> (2, -6.8)
  line L10 (2, -31.8) -> (-2, -31.8)
  circle A5 centre (0, 34.5) radius 1.5
  circle A6 centre (0, -34.5) radius 1.5
  point P0 (0, 19.3)
  dimension "d209" = 16
  dimension "d210" = 12.5
  dimension "d211" = 4
  dimension "d212" = 19.3
  dimension "d215" = 3
  dimension "d216" = 34.5
ref_plane "Plano de trabalho13" through (0, 0, 55.7) normal (0, 0, -1) x (-1, 0, 0)
ref_plane "Plano de trabalho14" through (0, 0, 60) normal (0, 0, 1) x (1, 0, 0)
sketch "Esboço25" plane through (0, 0, 55.7) normal (0, 0, -1) x (1, 0, 0)
  line L0 (-33.3617, 16) -> (33.3617, 16)
  circle A0 centre (0, 0) radius 37
  line L1 (0, 0) -> (-19.3, 0) construction
  line L2 (-33.3617, -16) -> (33.3617, -16)
  line L3 (-6.8, -2) -> (-6.8, 2)
  arc A1 (-6.8, 2) -> (-31.8, 2) centre (-19.3, 2) ccw
  line L4 (-31.8, 2) -> (-31.8, -2)
  arc A2 (-31.8, -2) -> (-6.8, -2) centre (-19.3, -2) ccw
  line L5 (-19.3, -2) -> (-19.3, 2) construction
  circle A3 centre (-34.5, 0) radius 1.5
  line L6 (0, 0) -> (0, -12) construction
  arc A4 (31.8, 2) -> (6.8, 2) centre (19.3, 2) ccw
  line L7 (6.8, -2) -> (6.8, 2)
  arc A5 (6.8, -2) -> (31.8, -2) centre (19.3, -2) ccw
  circle A6 centre (34.5, 0) radius 1.5
  line L8 (31.8, 2) -> (31.8, -2)
  point P0 (-19.3, 0)
  dimension "d219" = 16
  dimension "d220" = 12.5
  dimension "d221" = 4
  dimension "d222" = 19.3
  dimension "d224" = 34.5
  dimension "d225" = 3
ref_plane "Plano de trabalho15" through (0, 0, 47.7) normal (0, 0, 1) x (1, 0, 0)
ref_plane "Plano de trabalho16" through (0, 0, 57) normal (0, 0, 1) x (1, 0, 0)
sketch "Esboço26" plane through (0, 0, 57) normal (0, 0, 1) x (1, 0, 0)
  circle A0 centre (0, 0) radius 47.1699
extrude "Extrusão32" cut sketch "Esboço26" along normal blind 200
sketch "Esboço27" plane through (0, 0, 47.7) normal (0, 0, 1) x (1, 0, 0)
  circle A0 centre (0, 0) radius 46.5442
extrude "Extrusão33" cut sketch "Esboço27" against normal blind 100
